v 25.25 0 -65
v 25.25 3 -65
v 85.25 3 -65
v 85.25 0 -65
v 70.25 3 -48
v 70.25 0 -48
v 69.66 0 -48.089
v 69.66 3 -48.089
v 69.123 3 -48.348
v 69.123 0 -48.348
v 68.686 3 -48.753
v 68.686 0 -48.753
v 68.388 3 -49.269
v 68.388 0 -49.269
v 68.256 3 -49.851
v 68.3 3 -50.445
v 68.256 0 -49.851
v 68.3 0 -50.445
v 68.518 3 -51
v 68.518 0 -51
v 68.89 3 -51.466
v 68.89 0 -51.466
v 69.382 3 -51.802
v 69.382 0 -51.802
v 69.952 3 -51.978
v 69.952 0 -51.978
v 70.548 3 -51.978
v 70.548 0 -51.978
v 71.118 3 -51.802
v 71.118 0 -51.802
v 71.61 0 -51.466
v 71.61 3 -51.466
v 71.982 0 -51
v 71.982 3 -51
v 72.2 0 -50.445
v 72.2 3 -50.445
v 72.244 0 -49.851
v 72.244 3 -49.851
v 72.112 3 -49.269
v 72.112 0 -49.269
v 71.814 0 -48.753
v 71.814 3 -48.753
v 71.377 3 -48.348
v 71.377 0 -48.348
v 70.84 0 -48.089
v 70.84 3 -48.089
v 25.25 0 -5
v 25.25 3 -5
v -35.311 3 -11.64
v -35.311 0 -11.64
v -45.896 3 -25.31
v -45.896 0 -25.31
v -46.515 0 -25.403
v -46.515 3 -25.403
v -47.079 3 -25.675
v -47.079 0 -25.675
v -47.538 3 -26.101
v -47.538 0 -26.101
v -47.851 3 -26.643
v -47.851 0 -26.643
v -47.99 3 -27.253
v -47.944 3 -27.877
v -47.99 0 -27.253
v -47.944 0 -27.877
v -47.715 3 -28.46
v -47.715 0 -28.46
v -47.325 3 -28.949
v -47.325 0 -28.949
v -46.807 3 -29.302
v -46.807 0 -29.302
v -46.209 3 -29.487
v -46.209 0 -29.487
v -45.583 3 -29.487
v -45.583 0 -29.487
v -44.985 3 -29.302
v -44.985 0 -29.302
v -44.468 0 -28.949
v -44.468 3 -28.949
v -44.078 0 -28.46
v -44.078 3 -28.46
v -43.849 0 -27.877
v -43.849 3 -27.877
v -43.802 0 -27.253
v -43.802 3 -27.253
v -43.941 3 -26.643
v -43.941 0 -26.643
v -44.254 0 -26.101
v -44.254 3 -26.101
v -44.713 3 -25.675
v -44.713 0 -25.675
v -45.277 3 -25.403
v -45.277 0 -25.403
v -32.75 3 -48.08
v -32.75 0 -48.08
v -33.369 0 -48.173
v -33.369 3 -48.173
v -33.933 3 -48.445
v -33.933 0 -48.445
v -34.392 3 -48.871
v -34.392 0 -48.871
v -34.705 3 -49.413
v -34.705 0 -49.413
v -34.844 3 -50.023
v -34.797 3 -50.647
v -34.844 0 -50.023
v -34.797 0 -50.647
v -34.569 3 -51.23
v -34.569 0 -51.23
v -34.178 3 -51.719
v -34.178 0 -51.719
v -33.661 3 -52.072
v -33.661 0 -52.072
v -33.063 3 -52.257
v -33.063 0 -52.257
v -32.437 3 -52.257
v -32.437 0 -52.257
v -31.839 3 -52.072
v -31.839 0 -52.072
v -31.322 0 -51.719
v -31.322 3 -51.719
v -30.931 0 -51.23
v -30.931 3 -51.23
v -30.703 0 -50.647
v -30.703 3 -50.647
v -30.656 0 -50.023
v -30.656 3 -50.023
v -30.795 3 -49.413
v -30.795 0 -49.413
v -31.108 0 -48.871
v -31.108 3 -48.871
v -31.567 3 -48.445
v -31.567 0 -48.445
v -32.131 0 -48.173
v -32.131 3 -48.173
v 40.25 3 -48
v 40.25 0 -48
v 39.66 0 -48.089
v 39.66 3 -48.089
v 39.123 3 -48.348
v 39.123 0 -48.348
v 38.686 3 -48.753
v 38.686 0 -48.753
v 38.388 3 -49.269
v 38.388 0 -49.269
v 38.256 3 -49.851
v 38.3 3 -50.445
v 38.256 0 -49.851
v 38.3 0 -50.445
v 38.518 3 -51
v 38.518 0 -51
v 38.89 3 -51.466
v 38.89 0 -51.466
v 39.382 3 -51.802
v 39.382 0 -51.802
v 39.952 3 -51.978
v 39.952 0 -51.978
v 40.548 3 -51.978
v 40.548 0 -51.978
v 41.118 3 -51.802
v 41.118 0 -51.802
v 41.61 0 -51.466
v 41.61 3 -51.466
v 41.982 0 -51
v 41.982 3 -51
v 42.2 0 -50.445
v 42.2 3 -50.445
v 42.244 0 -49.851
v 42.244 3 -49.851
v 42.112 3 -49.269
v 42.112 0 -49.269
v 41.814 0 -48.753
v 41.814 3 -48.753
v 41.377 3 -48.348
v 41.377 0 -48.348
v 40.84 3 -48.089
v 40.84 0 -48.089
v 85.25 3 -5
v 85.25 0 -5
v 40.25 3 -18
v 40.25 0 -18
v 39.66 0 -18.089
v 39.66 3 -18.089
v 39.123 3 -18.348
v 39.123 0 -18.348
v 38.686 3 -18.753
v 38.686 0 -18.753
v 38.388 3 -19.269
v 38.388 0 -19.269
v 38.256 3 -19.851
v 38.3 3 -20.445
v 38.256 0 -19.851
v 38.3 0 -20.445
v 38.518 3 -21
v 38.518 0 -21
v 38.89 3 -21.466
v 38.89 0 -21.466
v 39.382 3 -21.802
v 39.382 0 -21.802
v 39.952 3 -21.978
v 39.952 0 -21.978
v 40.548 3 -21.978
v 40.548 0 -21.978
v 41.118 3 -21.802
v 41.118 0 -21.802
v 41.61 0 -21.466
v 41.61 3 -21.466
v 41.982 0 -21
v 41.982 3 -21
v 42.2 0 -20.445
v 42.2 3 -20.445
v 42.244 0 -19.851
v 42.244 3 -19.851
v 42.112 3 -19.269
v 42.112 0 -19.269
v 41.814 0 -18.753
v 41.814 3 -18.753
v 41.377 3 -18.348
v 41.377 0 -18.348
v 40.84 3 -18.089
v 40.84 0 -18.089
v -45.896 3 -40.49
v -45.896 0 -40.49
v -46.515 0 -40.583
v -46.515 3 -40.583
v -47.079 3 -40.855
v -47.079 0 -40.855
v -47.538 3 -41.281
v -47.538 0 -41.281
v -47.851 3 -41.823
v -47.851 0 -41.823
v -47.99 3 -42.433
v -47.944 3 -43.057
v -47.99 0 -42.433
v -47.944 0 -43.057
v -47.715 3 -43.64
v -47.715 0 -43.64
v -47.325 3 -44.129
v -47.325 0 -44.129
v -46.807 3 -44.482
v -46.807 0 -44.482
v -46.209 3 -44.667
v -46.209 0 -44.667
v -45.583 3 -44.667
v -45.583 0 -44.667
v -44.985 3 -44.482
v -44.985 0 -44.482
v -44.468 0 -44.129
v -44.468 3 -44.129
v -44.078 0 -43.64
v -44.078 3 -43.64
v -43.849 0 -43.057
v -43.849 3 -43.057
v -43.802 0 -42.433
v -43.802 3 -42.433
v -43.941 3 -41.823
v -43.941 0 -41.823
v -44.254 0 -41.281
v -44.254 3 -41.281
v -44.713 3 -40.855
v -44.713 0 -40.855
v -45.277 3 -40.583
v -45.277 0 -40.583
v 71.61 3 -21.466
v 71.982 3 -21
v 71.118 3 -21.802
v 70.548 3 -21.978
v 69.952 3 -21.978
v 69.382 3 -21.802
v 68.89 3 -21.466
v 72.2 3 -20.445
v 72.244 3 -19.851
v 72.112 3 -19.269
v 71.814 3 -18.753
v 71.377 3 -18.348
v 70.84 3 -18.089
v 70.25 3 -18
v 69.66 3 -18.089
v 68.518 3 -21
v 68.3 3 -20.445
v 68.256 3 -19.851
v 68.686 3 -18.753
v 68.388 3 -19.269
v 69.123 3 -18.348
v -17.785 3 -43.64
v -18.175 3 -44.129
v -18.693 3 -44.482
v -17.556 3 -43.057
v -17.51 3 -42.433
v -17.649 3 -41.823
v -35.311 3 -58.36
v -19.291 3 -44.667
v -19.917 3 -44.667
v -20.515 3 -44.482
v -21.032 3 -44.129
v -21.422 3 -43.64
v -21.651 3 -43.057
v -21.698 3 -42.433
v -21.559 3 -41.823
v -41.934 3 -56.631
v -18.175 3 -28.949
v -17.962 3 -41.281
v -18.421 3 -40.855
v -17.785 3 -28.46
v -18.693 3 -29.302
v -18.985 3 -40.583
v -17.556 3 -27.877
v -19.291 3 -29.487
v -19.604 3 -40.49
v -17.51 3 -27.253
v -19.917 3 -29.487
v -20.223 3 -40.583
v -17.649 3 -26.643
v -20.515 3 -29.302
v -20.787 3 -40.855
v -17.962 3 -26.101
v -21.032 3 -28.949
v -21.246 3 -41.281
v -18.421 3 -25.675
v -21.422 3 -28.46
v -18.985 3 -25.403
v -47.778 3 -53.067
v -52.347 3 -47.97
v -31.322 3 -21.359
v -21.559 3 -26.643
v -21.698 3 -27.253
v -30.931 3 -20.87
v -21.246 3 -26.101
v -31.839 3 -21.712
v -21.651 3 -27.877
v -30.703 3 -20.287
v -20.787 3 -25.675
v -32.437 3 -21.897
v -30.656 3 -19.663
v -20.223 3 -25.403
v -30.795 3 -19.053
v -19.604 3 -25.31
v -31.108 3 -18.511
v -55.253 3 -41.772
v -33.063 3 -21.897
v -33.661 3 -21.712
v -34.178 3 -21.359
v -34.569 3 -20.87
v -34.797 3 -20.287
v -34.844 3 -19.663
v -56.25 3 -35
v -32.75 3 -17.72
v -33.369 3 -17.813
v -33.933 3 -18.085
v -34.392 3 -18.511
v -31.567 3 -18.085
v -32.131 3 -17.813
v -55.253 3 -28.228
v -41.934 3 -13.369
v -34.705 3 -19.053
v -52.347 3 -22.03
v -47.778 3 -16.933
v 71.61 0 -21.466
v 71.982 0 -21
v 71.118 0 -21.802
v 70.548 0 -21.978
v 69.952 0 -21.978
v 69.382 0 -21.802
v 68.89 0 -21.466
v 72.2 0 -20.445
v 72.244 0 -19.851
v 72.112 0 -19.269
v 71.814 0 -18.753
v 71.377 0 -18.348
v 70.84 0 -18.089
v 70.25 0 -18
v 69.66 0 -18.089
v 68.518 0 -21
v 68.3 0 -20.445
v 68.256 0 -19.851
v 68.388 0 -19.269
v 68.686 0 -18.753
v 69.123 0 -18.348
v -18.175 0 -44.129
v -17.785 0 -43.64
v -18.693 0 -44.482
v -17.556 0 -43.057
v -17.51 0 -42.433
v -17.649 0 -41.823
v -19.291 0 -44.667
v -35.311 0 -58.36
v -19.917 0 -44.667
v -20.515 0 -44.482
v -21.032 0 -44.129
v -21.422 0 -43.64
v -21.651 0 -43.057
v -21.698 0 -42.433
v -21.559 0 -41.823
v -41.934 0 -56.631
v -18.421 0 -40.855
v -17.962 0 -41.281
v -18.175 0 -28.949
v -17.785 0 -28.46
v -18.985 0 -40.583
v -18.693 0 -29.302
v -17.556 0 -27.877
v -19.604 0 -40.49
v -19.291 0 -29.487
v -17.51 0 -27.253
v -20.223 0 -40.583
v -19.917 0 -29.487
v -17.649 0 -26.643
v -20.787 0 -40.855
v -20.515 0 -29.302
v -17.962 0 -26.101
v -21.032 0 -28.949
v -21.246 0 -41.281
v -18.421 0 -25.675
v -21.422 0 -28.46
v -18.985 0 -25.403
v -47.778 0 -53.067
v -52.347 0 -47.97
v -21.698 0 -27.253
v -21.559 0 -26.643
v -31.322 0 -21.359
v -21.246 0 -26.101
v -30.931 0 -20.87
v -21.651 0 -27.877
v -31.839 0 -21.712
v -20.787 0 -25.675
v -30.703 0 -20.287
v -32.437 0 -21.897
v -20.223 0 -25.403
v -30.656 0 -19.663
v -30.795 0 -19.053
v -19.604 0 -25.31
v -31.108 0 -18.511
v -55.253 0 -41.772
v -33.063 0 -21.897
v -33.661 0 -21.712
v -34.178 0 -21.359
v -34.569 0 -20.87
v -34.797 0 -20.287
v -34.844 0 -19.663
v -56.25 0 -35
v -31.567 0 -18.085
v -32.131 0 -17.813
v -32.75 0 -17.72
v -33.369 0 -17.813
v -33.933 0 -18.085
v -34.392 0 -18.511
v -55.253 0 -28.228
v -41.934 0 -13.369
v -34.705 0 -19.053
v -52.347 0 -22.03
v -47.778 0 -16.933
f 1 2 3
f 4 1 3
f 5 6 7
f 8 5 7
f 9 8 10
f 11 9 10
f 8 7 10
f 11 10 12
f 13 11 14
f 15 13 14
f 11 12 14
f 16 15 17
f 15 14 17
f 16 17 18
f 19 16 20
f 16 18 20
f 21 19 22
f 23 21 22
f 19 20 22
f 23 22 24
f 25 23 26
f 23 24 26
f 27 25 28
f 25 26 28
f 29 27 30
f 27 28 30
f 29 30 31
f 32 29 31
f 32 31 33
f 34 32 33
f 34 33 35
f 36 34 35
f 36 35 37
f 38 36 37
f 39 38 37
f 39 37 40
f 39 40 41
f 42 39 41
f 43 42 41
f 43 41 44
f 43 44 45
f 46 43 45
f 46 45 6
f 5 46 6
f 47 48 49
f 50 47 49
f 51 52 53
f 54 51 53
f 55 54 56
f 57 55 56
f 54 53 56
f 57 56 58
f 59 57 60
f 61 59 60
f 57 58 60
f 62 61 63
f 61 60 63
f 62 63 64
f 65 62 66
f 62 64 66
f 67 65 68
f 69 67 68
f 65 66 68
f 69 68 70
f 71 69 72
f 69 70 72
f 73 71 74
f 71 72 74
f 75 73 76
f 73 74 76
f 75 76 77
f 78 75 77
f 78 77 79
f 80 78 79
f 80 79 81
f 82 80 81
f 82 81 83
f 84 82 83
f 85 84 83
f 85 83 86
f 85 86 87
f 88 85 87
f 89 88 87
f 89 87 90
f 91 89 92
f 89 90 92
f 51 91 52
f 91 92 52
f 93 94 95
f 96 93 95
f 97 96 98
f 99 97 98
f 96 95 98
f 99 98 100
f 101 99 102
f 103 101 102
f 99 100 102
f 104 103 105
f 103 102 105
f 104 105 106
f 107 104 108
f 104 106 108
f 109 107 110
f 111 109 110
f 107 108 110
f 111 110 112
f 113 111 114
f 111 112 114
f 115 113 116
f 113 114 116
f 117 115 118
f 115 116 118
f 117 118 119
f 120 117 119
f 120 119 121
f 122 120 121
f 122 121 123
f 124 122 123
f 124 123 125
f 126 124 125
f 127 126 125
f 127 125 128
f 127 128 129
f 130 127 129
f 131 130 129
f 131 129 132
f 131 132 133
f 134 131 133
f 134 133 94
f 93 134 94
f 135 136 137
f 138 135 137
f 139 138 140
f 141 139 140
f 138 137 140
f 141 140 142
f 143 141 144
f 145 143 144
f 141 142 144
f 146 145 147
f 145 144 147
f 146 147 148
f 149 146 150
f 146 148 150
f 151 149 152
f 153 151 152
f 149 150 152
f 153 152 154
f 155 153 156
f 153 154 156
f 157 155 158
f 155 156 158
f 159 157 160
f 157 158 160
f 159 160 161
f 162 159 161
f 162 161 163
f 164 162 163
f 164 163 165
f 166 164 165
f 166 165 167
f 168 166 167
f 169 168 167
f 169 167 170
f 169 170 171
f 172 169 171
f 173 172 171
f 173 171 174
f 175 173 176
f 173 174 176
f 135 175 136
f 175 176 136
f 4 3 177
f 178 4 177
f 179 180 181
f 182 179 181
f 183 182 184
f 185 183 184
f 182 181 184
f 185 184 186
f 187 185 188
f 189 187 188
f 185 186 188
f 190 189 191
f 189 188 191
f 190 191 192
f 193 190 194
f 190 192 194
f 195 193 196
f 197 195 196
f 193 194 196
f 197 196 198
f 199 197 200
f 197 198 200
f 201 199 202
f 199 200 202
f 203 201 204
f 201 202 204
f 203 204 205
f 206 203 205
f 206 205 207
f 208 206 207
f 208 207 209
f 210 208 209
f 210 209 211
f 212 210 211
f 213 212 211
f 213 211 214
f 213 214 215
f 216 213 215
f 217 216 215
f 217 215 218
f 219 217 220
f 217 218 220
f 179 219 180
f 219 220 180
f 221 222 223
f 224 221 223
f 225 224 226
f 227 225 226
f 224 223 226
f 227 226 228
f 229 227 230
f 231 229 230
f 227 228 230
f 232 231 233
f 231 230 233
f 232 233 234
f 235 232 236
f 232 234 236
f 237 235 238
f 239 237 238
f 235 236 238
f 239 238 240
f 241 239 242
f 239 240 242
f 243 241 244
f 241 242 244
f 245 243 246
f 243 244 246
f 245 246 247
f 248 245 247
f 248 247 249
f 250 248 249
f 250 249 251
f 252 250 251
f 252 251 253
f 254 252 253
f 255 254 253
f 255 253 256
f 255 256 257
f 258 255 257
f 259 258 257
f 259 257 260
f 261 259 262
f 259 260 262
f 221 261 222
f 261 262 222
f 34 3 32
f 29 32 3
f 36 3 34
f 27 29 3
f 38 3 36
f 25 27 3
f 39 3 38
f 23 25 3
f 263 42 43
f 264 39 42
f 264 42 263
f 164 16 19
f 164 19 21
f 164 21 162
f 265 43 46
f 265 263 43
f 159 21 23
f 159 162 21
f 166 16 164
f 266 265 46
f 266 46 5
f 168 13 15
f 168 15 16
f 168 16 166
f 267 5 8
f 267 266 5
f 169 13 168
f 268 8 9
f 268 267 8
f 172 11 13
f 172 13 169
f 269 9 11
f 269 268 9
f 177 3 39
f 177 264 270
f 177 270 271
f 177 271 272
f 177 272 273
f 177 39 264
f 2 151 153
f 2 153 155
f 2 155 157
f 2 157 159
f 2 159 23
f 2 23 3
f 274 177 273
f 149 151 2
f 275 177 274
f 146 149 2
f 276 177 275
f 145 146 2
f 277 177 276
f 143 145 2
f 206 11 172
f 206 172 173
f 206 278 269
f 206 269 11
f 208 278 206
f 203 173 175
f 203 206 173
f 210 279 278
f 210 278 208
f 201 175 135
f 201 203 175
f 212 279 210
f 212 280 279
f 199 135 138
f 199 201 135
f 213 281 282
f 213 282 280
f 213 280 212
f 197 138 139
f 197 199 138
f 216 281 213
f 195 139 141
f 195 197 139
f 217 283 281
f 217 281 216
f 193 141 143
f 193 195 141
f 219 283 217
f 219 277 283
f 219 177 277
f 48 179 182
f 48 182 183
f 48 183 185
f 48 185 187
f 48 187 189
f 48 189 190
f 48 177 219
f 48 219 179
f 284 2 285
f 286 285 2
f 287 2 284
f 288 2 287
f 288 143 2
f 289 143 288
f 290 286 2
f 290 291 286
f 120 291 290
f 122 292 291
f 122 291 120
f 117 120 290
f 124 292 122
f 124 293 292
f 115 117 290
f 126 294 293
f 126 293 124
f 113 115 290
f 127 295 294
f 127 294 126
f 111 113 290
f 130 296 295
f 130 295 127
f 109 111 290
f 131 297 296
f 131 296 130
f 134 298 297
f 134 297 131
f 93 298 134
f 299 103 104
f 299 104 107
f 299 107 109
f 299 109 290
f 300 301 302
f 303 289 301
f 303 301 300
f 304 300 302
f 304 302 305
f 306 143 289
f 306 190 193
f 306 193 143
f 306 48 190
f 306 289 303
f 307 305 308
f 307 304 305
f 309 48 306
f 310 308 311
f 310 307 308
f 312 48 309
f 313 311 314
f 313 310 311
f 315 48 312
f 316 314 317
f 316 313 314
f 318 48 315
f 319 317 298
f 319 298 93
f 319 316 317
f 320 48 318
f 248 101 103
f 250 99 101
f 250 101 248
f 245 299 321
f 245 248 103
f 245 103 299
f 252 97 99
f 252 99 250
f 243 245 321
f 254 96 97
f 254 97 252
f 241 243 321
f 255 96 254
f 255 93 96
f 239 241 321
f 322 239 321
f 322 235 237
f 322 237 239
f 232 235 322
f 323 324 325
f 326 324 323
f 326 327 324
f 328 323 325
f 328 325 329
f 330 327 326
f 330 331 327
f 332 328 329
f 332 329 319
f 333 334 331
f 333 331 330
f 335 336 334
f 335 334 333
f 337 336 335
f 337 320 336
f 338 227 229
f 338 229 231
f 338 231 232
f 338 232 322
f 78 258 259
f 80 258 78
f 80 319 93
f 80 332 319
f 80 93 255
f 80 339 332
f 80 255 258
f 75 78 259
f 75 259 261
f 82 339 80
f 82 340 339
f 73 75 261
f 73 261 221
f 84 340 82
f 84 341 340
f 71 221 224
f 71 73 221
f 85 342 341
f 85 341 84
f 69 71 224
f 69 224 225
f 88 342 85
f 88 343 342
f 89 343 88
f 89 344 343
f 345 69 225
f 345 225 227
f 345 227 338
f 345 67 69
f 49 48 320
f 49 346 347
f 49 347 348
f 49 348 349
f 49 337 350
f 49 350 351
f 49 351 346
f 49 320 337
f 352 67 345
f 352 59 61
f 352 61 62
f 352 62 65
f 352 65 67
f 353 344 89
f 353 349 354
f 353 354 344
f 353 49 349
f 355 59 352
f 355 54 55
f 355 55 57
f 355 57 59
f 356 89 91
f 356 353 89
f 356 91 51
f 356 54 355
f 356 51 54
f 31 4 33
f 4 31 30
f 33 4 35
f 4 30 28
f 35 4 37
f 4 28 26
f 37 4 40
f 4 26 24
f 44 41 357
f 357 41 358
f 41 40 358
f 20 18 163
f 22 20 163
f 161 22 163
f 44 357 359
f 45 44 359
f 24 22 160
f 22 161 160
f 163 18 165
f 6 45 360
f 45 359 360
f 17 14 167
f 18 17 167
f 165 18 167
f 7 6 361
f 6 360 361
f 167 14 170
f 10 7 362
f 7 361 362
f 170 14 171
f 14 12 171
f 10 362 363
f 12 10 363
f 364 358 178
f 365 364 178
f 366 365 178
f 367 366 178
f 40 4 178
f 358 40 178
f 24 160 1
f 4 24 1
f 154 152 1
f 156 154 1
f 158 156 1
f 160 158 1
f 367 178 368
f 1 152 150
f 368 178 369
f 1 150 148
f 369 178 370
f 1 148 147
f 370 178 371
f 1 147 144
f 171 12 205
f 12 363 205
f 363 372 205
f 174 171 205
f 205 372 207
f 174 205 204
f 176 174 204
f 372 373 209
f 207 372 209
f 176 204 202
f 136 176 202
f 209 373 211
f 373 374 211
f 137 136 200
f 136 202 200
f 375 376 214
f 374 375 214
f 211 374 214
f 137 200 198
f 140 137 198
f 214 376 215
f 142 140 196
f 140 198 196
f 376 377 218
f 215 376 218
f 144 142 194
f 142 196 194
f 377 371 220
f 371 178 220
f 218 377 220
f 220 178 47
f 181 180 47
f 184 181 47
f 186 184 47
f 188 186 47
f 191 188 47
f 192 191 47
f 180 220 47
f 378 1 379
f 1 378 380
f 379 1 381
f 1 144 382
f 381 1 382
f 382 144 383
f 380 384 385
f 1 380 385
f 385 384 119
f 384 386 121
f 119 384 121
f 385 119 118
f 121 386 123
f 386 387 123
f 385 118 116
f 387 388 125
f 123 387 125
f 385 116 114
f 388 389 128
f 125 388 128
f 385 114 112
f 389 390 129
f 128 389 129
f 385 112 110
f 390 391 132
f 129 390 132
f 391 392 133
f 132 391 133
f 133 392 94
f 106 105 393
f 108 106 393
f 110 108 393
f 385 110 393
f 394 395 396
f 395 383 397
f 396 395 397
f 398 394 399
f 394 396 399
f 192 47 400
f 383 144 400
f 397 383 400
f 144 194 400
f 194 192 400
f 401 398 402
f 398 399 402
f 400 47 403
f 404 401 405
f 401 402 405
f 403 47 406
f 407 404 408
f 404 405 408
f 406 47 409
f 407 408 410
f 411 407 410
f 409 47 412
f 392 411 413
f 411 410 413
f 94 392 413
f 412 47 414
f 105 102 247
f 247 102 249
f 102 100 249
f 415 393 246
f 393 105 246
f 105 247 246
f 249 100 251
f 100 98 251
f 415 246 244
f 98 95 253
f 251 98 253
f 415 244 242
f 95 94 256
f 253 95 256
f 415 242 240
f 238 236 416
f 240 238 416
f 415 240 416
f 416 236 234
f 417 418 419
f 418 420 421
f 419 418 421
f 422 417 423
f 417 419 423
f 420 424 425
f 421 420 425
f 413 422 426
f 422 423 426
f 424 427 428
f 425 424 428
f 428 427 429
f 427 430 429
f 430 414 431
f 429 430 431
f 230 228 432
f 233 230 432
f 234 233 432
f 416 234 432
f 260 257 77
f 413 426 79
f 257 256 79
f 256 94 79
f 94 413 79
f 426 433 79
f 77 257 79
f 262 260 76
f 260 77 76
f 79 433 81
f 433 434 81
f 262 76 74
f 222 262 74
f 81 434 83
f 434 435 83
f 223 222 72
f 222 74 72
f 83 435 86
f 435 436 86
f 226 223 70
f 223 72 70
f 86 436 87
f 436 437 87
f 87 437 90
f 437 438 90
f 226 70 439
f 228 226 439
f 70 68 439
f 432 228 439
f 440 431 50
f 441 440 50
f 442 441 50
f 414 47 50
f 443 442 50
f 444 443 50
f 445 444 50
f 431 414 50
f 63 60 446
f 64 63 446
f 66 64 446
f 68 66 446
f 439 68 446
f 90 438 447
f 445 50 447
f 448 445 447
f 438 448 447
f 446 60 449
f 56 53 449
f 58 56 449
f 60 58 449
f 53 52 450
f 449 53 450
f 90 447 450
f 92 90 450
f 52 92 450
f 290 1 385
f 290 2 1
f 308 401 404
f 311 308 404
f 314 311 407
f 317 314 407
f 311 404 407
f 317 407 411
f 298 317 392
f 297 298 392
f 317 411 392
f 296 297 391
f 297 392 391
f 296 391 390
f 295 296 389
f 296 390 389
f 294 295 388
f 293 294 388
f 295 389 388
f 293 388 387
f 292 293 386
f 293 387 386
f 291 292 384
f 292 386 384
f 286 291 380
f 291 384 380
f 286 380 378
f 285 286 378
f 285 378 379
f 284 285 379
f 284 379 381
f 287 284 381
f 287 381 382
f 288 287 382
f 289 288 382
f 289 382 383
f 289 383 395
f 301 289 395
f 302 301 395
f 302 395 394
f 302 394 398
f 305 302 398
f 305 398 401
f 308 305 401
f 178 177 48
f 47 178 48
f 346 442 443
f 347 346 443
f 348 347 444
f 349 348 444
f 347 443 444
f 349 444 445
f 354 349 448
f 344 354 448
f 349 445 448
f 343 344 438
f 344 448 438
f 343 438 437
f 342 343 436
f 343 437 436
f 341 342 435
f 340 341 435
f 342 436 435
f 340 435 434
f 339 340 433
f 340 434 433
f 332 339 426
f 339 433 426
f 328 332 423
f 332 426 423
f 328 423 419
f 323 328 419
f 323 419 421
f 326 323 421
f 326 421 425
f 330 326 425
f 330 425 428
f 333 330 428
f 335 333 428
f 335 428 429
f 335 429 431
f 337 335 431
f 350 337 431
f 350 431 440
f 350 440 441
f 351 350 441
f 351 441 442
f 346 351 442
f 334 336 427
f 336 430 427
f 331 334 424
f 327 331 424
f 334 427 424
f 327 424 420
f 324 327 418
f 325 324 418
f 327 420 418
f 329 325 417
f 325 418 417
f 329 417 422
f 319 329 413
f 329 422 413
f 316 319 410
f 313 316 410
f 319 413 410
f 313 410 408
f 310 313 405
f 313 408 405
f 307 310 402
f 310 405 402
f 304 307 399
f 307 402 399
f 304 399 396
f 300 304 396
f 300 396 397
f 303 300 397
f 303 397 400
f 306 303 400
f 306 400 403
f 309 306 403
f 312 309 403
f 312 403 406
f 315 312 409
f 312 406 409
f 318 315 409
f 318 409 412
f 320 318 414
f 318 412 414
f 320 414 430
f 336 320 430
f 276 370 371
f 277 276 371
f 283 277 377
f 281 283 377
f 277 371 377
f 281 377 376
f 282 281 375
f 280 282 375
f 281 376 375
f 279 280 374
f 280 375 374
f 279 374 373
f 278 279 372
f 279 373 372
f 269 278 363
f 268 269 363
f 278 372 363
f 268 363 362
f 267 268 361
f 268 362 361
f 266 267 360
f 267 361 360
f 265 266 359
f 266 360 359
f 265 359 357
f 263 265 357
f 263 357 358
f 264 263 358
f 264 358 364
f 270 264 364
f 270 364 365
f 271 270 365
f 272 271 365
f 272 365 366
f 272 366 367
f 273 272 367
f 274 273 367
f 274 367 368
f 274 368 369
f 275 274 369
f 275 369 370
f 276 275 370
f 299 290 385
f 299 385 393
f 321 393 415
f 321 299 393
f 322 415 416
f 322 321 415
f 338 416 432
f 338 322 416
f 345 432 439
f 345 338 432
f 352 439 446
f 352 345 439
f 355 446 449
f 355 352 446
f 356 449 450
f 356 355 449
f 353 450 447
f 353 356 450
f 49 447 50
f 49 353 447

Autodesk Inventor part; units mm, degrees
ref_plane "YZ Plane" through (0, 0, 0) normal (1, 0, 0) x (0, 1, 0)
ref_plane "XZ Plane" through (0, 0, 0) normal (0, 1, 0) x (-1, 0, 0)
ref_plane "XY Plane" through (0, 0, 0) normal (0, 0, 1) x (1, 0, 0)
sketch "スケッチ1" plane through (0, 0, 0) normal (0, 1, 0) x (-1, 0, 0)
  line L0 (0, 0) -> (65.5, 0)
  line L1 (65.5, 0) -> (65.5, -70)
  line L2 (65.5, -70) -> (0, -70)
  line L3 (0, -70) -> (0, 0)
  dimension "d0" = 65.5
  dimension "d1" = 70
extrude "押し出し1" add sketch "スケッチ1" along normal blind 3
sketch "スケッチ3" plane through (0, 3, 0) normal (0, 1, 0) x (1, 0, 0)
  line L0 (-65.5, 0) -> (0, 0) projected
  line L1 (-32.75, 0) -> (-32.75, 70)
  line L2 (0, 70) -> (-65.5, 70) projected
  circle A0 centre (-32.75, 35) radius 15.18
  point P0 (-32.75, 50.18)
  point P1 (-45.8963, 42.59)
  point P2 (-45.8963, 27.41)
  point P3 (-32.75, 19.82)
  point P4 (-19.6037, 27.41)
  point P5 (-19.6037, 42.59)
  dimension "d15" = 30.36
  dimension "d18" = 360
hole "穴2" at (-32.75, 3, -50.18) at (-45.8963, 3, -42.59) at (-45.8963, 3, -27.41) at (-32.75, 3, -19.82) at (-19.6037, 3, -27.41) at (-19.6037, 3, -42.59) direction (0, -1, 0) diameter 4.2 end through all
sketch "スケッチ4" plane through (0, 3, 0) normal (0, 1, 0) x (1, 0, 0)
  line L0 (-65.5, 70) -> (-65.5, 0) projected
  line L1 (0, 70) -> (-65.5, 70) projected
  circle A0 centre (-32.75, 35) radius 23.5
  line L2 (0, 0) -> (0, 70) projected
  line L3 (-65.5, 70) -> (0, 70)
  line L4 (0, 70) -> (0, 0)
  line L5 (0, 0) -> (-65.5, 0)
  line L6 (-65.5, 0) -> (-65.5, 70)
  dimension "d27" = 47
  dimension "d28" = 35
  dimension "d29" = 32.75
extrude "押し出し2" cut sketch "スケッチ4" against normal blind 3
sketch "スケッチ5" plane through (-32.75, 3, -35) normal (0, 1, 0) x (1, 0, 0)
  line L0 (58, 30) -> (118, 30)
  line L1 (118, 30) -> (118, -30)
  line L2 (118, -30) -> (58, -30)
  line L3 (58, -30) -> (58, 30)
  circle A0 centre (0, 0) radius 23.5 projected
  line L4 (58, 30) -> (-2.5612, 23.36)
  circle A1 centre (0, 0) radius 23.5
  line L5 (58, -30) -> (-2.5612, -23.36)
  point P0 (32.75, -35)
  point P1 (-2.5612, -23.36)
  dimension "d32" = 60
  dimension "d33" = 60
  dimension "d34" = 30
  dimension "d35" = 58
extrude "押し出し3" add sketch "スケッチ5" against normal blind 3 contours L0 L1 L2 L3 | L3 L5 A0 L4
sketch "スケッチ6" plane through (0, 3, 0) normal (0, 1, 0) x (1, 0, 0)
  line L0 (40.25, 50) -> (70.25, 50)
  line L1 (70.25, 50) -> (70.25, 20)
  line L2 (70.25, 20) -> (40.25, 20)
  line L3 (40.25, 20) -> (40.25, 50)
  line L4 (85.25, 65) -> (25.25, 65) projected
  point P0 (0, 0)
  dimension "d38" = 30
  dimension "d39" = 30
  dimension "d40" = 15
  dimension "d41" = 15
hole "穴3" at (70.25, 3, -50) at (40.25, 3, -50) at (40.25, 3, -20) at (70.25, 3, -20) direction (0, -1, 0) diameter 4 end through all
properties part number "link3_plate1" material "アルミニウム 6061"
